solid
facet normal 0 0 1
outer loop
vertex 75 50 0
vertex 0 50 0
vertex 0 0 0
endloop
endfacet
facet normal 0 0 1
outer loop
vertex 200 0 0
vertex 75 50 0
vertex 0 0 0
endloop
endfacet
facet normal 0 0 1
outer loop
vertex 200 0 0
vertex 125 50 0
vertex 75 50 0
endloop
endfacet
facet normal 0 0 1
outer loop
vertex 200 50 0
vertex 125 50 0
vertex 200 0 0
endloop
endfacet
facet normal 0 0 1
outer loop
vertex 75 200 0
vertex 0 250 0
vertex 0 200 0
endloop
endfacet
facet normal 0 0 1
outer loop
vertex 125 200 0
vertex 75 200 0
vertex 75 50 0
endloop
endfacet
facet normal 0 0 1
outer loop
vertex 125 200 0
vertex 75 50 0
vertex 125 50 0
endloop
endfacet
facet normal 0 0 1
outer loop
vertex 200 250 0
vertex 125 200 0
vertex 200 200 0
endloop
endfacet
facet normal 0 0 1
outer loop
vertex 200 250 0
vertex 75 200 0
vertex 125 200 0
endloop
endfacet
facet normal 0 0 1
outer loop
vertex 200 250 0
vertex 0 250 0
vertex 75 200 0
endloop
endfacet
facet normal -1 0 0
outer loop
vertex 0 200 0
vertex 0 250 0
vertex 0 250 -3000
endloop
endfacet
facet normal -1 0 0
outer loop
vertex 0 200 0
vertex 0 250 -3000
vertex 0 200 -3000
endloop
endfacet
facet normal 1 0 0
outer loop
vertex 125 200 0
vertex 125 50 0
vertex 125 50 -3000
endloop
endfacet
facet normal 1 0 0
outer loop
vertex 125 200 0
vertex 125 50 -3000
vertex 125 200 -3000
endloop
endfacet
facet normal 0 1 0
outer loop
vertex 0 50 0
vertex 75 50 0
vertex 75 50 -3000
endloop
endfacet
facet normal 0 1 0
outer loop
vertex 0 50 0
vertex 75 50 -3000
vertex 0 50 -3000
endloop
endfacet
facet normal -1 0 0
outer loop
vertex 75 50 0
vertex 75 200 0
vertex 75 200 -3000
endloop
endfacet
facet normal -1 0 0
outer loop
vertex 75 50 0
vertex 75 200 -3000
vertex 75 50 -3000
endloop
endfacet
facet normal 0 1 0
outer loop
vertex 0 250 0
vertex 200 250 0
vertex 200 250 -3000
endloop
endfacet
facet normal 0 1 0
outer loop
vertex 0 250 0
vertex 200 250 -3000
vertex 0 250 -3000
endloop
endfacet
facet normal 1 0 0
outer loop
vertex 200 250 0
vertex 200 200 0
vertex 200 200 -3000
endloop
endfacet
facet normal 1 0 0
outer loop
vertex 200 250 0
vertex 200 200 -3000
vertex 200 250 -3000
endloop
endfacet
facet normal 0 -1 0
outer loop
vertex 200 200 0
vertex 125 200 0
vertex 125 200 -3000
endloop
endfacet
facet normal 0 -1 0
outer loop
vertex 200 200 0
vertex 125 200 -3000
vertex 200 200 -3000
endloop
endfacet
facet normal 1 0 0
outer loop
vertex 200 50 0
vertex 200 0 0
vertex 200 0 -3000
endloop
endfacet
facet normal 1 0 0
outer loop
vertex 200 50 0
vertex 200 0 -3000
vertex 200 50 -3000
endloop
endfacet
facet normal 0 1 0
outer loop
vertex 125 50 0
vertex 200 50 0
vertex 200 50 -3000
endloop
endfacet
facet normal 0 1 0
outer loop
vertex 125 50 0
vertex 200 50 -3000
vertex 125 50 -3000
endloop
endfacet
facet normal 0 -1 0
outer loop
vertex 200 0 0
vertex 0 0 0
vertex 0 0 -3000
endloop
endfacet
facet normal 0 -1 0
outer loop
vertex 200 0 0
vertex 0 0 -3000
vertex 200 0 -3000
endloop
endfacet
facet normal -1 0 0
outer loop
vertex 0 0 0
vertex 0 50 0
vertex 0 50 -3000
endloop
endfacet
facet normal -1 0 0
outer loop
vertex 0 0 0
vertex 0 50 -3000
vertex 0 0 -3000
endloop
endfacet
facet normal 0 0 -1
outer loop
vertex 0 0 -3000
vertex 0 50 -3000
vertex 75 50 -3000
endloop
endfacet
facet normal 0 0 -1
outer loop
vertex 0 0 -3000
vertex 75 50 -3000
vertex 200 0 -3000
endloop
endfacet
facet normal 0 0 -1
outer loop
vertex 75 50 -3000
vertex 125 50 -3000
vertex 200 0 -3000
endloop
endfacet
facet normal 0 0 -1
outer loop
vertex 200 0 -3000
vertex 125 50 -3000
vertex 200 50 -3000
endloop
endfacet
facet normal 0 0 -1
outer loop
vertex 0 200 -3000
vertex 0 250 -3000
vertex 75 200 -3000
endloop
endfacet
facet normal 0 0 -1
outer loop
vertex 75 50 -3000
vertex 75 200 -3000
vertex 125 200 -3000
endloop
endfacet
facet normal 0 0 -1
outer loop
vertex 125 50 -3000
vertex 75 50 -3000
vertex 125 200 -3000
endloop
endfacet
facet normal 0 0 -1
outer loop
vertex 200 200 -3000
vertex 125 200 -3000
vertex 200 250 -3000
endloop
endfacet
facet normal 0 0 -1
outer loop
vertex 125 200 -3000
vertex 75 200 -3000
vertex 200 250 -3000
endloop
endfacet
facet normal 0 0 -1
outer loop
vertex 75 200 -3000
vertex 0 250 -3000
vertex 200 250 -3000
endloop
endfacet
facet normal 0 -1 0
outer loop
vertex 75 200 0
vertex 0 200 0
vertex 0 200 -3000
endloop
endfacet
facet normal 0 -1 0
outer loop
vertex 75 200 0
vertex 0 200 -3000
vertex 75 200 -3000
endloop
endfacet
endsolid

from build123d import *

# Parameters (mm, degrees)
DODANIE_WYCI_GNI_CIE1_DEPTH = 3000


with BuildPart() as part:
    # Szkic1 → Dodanie-wyciągnięcie1 (new body)
    with BuildSketch(Plane.XY):
        Polygon((0, 0), (200, 0), (200, 50), (125, 50), (125, 200), (200, 200), (200, 250), (0, 250), (0, 200), (75, 200), (75, 50), (0, 50), align=None)
    extrude(amount=-DODANIE_WYCI_GNI_CIE1_DEPTH)


solid = part.part
